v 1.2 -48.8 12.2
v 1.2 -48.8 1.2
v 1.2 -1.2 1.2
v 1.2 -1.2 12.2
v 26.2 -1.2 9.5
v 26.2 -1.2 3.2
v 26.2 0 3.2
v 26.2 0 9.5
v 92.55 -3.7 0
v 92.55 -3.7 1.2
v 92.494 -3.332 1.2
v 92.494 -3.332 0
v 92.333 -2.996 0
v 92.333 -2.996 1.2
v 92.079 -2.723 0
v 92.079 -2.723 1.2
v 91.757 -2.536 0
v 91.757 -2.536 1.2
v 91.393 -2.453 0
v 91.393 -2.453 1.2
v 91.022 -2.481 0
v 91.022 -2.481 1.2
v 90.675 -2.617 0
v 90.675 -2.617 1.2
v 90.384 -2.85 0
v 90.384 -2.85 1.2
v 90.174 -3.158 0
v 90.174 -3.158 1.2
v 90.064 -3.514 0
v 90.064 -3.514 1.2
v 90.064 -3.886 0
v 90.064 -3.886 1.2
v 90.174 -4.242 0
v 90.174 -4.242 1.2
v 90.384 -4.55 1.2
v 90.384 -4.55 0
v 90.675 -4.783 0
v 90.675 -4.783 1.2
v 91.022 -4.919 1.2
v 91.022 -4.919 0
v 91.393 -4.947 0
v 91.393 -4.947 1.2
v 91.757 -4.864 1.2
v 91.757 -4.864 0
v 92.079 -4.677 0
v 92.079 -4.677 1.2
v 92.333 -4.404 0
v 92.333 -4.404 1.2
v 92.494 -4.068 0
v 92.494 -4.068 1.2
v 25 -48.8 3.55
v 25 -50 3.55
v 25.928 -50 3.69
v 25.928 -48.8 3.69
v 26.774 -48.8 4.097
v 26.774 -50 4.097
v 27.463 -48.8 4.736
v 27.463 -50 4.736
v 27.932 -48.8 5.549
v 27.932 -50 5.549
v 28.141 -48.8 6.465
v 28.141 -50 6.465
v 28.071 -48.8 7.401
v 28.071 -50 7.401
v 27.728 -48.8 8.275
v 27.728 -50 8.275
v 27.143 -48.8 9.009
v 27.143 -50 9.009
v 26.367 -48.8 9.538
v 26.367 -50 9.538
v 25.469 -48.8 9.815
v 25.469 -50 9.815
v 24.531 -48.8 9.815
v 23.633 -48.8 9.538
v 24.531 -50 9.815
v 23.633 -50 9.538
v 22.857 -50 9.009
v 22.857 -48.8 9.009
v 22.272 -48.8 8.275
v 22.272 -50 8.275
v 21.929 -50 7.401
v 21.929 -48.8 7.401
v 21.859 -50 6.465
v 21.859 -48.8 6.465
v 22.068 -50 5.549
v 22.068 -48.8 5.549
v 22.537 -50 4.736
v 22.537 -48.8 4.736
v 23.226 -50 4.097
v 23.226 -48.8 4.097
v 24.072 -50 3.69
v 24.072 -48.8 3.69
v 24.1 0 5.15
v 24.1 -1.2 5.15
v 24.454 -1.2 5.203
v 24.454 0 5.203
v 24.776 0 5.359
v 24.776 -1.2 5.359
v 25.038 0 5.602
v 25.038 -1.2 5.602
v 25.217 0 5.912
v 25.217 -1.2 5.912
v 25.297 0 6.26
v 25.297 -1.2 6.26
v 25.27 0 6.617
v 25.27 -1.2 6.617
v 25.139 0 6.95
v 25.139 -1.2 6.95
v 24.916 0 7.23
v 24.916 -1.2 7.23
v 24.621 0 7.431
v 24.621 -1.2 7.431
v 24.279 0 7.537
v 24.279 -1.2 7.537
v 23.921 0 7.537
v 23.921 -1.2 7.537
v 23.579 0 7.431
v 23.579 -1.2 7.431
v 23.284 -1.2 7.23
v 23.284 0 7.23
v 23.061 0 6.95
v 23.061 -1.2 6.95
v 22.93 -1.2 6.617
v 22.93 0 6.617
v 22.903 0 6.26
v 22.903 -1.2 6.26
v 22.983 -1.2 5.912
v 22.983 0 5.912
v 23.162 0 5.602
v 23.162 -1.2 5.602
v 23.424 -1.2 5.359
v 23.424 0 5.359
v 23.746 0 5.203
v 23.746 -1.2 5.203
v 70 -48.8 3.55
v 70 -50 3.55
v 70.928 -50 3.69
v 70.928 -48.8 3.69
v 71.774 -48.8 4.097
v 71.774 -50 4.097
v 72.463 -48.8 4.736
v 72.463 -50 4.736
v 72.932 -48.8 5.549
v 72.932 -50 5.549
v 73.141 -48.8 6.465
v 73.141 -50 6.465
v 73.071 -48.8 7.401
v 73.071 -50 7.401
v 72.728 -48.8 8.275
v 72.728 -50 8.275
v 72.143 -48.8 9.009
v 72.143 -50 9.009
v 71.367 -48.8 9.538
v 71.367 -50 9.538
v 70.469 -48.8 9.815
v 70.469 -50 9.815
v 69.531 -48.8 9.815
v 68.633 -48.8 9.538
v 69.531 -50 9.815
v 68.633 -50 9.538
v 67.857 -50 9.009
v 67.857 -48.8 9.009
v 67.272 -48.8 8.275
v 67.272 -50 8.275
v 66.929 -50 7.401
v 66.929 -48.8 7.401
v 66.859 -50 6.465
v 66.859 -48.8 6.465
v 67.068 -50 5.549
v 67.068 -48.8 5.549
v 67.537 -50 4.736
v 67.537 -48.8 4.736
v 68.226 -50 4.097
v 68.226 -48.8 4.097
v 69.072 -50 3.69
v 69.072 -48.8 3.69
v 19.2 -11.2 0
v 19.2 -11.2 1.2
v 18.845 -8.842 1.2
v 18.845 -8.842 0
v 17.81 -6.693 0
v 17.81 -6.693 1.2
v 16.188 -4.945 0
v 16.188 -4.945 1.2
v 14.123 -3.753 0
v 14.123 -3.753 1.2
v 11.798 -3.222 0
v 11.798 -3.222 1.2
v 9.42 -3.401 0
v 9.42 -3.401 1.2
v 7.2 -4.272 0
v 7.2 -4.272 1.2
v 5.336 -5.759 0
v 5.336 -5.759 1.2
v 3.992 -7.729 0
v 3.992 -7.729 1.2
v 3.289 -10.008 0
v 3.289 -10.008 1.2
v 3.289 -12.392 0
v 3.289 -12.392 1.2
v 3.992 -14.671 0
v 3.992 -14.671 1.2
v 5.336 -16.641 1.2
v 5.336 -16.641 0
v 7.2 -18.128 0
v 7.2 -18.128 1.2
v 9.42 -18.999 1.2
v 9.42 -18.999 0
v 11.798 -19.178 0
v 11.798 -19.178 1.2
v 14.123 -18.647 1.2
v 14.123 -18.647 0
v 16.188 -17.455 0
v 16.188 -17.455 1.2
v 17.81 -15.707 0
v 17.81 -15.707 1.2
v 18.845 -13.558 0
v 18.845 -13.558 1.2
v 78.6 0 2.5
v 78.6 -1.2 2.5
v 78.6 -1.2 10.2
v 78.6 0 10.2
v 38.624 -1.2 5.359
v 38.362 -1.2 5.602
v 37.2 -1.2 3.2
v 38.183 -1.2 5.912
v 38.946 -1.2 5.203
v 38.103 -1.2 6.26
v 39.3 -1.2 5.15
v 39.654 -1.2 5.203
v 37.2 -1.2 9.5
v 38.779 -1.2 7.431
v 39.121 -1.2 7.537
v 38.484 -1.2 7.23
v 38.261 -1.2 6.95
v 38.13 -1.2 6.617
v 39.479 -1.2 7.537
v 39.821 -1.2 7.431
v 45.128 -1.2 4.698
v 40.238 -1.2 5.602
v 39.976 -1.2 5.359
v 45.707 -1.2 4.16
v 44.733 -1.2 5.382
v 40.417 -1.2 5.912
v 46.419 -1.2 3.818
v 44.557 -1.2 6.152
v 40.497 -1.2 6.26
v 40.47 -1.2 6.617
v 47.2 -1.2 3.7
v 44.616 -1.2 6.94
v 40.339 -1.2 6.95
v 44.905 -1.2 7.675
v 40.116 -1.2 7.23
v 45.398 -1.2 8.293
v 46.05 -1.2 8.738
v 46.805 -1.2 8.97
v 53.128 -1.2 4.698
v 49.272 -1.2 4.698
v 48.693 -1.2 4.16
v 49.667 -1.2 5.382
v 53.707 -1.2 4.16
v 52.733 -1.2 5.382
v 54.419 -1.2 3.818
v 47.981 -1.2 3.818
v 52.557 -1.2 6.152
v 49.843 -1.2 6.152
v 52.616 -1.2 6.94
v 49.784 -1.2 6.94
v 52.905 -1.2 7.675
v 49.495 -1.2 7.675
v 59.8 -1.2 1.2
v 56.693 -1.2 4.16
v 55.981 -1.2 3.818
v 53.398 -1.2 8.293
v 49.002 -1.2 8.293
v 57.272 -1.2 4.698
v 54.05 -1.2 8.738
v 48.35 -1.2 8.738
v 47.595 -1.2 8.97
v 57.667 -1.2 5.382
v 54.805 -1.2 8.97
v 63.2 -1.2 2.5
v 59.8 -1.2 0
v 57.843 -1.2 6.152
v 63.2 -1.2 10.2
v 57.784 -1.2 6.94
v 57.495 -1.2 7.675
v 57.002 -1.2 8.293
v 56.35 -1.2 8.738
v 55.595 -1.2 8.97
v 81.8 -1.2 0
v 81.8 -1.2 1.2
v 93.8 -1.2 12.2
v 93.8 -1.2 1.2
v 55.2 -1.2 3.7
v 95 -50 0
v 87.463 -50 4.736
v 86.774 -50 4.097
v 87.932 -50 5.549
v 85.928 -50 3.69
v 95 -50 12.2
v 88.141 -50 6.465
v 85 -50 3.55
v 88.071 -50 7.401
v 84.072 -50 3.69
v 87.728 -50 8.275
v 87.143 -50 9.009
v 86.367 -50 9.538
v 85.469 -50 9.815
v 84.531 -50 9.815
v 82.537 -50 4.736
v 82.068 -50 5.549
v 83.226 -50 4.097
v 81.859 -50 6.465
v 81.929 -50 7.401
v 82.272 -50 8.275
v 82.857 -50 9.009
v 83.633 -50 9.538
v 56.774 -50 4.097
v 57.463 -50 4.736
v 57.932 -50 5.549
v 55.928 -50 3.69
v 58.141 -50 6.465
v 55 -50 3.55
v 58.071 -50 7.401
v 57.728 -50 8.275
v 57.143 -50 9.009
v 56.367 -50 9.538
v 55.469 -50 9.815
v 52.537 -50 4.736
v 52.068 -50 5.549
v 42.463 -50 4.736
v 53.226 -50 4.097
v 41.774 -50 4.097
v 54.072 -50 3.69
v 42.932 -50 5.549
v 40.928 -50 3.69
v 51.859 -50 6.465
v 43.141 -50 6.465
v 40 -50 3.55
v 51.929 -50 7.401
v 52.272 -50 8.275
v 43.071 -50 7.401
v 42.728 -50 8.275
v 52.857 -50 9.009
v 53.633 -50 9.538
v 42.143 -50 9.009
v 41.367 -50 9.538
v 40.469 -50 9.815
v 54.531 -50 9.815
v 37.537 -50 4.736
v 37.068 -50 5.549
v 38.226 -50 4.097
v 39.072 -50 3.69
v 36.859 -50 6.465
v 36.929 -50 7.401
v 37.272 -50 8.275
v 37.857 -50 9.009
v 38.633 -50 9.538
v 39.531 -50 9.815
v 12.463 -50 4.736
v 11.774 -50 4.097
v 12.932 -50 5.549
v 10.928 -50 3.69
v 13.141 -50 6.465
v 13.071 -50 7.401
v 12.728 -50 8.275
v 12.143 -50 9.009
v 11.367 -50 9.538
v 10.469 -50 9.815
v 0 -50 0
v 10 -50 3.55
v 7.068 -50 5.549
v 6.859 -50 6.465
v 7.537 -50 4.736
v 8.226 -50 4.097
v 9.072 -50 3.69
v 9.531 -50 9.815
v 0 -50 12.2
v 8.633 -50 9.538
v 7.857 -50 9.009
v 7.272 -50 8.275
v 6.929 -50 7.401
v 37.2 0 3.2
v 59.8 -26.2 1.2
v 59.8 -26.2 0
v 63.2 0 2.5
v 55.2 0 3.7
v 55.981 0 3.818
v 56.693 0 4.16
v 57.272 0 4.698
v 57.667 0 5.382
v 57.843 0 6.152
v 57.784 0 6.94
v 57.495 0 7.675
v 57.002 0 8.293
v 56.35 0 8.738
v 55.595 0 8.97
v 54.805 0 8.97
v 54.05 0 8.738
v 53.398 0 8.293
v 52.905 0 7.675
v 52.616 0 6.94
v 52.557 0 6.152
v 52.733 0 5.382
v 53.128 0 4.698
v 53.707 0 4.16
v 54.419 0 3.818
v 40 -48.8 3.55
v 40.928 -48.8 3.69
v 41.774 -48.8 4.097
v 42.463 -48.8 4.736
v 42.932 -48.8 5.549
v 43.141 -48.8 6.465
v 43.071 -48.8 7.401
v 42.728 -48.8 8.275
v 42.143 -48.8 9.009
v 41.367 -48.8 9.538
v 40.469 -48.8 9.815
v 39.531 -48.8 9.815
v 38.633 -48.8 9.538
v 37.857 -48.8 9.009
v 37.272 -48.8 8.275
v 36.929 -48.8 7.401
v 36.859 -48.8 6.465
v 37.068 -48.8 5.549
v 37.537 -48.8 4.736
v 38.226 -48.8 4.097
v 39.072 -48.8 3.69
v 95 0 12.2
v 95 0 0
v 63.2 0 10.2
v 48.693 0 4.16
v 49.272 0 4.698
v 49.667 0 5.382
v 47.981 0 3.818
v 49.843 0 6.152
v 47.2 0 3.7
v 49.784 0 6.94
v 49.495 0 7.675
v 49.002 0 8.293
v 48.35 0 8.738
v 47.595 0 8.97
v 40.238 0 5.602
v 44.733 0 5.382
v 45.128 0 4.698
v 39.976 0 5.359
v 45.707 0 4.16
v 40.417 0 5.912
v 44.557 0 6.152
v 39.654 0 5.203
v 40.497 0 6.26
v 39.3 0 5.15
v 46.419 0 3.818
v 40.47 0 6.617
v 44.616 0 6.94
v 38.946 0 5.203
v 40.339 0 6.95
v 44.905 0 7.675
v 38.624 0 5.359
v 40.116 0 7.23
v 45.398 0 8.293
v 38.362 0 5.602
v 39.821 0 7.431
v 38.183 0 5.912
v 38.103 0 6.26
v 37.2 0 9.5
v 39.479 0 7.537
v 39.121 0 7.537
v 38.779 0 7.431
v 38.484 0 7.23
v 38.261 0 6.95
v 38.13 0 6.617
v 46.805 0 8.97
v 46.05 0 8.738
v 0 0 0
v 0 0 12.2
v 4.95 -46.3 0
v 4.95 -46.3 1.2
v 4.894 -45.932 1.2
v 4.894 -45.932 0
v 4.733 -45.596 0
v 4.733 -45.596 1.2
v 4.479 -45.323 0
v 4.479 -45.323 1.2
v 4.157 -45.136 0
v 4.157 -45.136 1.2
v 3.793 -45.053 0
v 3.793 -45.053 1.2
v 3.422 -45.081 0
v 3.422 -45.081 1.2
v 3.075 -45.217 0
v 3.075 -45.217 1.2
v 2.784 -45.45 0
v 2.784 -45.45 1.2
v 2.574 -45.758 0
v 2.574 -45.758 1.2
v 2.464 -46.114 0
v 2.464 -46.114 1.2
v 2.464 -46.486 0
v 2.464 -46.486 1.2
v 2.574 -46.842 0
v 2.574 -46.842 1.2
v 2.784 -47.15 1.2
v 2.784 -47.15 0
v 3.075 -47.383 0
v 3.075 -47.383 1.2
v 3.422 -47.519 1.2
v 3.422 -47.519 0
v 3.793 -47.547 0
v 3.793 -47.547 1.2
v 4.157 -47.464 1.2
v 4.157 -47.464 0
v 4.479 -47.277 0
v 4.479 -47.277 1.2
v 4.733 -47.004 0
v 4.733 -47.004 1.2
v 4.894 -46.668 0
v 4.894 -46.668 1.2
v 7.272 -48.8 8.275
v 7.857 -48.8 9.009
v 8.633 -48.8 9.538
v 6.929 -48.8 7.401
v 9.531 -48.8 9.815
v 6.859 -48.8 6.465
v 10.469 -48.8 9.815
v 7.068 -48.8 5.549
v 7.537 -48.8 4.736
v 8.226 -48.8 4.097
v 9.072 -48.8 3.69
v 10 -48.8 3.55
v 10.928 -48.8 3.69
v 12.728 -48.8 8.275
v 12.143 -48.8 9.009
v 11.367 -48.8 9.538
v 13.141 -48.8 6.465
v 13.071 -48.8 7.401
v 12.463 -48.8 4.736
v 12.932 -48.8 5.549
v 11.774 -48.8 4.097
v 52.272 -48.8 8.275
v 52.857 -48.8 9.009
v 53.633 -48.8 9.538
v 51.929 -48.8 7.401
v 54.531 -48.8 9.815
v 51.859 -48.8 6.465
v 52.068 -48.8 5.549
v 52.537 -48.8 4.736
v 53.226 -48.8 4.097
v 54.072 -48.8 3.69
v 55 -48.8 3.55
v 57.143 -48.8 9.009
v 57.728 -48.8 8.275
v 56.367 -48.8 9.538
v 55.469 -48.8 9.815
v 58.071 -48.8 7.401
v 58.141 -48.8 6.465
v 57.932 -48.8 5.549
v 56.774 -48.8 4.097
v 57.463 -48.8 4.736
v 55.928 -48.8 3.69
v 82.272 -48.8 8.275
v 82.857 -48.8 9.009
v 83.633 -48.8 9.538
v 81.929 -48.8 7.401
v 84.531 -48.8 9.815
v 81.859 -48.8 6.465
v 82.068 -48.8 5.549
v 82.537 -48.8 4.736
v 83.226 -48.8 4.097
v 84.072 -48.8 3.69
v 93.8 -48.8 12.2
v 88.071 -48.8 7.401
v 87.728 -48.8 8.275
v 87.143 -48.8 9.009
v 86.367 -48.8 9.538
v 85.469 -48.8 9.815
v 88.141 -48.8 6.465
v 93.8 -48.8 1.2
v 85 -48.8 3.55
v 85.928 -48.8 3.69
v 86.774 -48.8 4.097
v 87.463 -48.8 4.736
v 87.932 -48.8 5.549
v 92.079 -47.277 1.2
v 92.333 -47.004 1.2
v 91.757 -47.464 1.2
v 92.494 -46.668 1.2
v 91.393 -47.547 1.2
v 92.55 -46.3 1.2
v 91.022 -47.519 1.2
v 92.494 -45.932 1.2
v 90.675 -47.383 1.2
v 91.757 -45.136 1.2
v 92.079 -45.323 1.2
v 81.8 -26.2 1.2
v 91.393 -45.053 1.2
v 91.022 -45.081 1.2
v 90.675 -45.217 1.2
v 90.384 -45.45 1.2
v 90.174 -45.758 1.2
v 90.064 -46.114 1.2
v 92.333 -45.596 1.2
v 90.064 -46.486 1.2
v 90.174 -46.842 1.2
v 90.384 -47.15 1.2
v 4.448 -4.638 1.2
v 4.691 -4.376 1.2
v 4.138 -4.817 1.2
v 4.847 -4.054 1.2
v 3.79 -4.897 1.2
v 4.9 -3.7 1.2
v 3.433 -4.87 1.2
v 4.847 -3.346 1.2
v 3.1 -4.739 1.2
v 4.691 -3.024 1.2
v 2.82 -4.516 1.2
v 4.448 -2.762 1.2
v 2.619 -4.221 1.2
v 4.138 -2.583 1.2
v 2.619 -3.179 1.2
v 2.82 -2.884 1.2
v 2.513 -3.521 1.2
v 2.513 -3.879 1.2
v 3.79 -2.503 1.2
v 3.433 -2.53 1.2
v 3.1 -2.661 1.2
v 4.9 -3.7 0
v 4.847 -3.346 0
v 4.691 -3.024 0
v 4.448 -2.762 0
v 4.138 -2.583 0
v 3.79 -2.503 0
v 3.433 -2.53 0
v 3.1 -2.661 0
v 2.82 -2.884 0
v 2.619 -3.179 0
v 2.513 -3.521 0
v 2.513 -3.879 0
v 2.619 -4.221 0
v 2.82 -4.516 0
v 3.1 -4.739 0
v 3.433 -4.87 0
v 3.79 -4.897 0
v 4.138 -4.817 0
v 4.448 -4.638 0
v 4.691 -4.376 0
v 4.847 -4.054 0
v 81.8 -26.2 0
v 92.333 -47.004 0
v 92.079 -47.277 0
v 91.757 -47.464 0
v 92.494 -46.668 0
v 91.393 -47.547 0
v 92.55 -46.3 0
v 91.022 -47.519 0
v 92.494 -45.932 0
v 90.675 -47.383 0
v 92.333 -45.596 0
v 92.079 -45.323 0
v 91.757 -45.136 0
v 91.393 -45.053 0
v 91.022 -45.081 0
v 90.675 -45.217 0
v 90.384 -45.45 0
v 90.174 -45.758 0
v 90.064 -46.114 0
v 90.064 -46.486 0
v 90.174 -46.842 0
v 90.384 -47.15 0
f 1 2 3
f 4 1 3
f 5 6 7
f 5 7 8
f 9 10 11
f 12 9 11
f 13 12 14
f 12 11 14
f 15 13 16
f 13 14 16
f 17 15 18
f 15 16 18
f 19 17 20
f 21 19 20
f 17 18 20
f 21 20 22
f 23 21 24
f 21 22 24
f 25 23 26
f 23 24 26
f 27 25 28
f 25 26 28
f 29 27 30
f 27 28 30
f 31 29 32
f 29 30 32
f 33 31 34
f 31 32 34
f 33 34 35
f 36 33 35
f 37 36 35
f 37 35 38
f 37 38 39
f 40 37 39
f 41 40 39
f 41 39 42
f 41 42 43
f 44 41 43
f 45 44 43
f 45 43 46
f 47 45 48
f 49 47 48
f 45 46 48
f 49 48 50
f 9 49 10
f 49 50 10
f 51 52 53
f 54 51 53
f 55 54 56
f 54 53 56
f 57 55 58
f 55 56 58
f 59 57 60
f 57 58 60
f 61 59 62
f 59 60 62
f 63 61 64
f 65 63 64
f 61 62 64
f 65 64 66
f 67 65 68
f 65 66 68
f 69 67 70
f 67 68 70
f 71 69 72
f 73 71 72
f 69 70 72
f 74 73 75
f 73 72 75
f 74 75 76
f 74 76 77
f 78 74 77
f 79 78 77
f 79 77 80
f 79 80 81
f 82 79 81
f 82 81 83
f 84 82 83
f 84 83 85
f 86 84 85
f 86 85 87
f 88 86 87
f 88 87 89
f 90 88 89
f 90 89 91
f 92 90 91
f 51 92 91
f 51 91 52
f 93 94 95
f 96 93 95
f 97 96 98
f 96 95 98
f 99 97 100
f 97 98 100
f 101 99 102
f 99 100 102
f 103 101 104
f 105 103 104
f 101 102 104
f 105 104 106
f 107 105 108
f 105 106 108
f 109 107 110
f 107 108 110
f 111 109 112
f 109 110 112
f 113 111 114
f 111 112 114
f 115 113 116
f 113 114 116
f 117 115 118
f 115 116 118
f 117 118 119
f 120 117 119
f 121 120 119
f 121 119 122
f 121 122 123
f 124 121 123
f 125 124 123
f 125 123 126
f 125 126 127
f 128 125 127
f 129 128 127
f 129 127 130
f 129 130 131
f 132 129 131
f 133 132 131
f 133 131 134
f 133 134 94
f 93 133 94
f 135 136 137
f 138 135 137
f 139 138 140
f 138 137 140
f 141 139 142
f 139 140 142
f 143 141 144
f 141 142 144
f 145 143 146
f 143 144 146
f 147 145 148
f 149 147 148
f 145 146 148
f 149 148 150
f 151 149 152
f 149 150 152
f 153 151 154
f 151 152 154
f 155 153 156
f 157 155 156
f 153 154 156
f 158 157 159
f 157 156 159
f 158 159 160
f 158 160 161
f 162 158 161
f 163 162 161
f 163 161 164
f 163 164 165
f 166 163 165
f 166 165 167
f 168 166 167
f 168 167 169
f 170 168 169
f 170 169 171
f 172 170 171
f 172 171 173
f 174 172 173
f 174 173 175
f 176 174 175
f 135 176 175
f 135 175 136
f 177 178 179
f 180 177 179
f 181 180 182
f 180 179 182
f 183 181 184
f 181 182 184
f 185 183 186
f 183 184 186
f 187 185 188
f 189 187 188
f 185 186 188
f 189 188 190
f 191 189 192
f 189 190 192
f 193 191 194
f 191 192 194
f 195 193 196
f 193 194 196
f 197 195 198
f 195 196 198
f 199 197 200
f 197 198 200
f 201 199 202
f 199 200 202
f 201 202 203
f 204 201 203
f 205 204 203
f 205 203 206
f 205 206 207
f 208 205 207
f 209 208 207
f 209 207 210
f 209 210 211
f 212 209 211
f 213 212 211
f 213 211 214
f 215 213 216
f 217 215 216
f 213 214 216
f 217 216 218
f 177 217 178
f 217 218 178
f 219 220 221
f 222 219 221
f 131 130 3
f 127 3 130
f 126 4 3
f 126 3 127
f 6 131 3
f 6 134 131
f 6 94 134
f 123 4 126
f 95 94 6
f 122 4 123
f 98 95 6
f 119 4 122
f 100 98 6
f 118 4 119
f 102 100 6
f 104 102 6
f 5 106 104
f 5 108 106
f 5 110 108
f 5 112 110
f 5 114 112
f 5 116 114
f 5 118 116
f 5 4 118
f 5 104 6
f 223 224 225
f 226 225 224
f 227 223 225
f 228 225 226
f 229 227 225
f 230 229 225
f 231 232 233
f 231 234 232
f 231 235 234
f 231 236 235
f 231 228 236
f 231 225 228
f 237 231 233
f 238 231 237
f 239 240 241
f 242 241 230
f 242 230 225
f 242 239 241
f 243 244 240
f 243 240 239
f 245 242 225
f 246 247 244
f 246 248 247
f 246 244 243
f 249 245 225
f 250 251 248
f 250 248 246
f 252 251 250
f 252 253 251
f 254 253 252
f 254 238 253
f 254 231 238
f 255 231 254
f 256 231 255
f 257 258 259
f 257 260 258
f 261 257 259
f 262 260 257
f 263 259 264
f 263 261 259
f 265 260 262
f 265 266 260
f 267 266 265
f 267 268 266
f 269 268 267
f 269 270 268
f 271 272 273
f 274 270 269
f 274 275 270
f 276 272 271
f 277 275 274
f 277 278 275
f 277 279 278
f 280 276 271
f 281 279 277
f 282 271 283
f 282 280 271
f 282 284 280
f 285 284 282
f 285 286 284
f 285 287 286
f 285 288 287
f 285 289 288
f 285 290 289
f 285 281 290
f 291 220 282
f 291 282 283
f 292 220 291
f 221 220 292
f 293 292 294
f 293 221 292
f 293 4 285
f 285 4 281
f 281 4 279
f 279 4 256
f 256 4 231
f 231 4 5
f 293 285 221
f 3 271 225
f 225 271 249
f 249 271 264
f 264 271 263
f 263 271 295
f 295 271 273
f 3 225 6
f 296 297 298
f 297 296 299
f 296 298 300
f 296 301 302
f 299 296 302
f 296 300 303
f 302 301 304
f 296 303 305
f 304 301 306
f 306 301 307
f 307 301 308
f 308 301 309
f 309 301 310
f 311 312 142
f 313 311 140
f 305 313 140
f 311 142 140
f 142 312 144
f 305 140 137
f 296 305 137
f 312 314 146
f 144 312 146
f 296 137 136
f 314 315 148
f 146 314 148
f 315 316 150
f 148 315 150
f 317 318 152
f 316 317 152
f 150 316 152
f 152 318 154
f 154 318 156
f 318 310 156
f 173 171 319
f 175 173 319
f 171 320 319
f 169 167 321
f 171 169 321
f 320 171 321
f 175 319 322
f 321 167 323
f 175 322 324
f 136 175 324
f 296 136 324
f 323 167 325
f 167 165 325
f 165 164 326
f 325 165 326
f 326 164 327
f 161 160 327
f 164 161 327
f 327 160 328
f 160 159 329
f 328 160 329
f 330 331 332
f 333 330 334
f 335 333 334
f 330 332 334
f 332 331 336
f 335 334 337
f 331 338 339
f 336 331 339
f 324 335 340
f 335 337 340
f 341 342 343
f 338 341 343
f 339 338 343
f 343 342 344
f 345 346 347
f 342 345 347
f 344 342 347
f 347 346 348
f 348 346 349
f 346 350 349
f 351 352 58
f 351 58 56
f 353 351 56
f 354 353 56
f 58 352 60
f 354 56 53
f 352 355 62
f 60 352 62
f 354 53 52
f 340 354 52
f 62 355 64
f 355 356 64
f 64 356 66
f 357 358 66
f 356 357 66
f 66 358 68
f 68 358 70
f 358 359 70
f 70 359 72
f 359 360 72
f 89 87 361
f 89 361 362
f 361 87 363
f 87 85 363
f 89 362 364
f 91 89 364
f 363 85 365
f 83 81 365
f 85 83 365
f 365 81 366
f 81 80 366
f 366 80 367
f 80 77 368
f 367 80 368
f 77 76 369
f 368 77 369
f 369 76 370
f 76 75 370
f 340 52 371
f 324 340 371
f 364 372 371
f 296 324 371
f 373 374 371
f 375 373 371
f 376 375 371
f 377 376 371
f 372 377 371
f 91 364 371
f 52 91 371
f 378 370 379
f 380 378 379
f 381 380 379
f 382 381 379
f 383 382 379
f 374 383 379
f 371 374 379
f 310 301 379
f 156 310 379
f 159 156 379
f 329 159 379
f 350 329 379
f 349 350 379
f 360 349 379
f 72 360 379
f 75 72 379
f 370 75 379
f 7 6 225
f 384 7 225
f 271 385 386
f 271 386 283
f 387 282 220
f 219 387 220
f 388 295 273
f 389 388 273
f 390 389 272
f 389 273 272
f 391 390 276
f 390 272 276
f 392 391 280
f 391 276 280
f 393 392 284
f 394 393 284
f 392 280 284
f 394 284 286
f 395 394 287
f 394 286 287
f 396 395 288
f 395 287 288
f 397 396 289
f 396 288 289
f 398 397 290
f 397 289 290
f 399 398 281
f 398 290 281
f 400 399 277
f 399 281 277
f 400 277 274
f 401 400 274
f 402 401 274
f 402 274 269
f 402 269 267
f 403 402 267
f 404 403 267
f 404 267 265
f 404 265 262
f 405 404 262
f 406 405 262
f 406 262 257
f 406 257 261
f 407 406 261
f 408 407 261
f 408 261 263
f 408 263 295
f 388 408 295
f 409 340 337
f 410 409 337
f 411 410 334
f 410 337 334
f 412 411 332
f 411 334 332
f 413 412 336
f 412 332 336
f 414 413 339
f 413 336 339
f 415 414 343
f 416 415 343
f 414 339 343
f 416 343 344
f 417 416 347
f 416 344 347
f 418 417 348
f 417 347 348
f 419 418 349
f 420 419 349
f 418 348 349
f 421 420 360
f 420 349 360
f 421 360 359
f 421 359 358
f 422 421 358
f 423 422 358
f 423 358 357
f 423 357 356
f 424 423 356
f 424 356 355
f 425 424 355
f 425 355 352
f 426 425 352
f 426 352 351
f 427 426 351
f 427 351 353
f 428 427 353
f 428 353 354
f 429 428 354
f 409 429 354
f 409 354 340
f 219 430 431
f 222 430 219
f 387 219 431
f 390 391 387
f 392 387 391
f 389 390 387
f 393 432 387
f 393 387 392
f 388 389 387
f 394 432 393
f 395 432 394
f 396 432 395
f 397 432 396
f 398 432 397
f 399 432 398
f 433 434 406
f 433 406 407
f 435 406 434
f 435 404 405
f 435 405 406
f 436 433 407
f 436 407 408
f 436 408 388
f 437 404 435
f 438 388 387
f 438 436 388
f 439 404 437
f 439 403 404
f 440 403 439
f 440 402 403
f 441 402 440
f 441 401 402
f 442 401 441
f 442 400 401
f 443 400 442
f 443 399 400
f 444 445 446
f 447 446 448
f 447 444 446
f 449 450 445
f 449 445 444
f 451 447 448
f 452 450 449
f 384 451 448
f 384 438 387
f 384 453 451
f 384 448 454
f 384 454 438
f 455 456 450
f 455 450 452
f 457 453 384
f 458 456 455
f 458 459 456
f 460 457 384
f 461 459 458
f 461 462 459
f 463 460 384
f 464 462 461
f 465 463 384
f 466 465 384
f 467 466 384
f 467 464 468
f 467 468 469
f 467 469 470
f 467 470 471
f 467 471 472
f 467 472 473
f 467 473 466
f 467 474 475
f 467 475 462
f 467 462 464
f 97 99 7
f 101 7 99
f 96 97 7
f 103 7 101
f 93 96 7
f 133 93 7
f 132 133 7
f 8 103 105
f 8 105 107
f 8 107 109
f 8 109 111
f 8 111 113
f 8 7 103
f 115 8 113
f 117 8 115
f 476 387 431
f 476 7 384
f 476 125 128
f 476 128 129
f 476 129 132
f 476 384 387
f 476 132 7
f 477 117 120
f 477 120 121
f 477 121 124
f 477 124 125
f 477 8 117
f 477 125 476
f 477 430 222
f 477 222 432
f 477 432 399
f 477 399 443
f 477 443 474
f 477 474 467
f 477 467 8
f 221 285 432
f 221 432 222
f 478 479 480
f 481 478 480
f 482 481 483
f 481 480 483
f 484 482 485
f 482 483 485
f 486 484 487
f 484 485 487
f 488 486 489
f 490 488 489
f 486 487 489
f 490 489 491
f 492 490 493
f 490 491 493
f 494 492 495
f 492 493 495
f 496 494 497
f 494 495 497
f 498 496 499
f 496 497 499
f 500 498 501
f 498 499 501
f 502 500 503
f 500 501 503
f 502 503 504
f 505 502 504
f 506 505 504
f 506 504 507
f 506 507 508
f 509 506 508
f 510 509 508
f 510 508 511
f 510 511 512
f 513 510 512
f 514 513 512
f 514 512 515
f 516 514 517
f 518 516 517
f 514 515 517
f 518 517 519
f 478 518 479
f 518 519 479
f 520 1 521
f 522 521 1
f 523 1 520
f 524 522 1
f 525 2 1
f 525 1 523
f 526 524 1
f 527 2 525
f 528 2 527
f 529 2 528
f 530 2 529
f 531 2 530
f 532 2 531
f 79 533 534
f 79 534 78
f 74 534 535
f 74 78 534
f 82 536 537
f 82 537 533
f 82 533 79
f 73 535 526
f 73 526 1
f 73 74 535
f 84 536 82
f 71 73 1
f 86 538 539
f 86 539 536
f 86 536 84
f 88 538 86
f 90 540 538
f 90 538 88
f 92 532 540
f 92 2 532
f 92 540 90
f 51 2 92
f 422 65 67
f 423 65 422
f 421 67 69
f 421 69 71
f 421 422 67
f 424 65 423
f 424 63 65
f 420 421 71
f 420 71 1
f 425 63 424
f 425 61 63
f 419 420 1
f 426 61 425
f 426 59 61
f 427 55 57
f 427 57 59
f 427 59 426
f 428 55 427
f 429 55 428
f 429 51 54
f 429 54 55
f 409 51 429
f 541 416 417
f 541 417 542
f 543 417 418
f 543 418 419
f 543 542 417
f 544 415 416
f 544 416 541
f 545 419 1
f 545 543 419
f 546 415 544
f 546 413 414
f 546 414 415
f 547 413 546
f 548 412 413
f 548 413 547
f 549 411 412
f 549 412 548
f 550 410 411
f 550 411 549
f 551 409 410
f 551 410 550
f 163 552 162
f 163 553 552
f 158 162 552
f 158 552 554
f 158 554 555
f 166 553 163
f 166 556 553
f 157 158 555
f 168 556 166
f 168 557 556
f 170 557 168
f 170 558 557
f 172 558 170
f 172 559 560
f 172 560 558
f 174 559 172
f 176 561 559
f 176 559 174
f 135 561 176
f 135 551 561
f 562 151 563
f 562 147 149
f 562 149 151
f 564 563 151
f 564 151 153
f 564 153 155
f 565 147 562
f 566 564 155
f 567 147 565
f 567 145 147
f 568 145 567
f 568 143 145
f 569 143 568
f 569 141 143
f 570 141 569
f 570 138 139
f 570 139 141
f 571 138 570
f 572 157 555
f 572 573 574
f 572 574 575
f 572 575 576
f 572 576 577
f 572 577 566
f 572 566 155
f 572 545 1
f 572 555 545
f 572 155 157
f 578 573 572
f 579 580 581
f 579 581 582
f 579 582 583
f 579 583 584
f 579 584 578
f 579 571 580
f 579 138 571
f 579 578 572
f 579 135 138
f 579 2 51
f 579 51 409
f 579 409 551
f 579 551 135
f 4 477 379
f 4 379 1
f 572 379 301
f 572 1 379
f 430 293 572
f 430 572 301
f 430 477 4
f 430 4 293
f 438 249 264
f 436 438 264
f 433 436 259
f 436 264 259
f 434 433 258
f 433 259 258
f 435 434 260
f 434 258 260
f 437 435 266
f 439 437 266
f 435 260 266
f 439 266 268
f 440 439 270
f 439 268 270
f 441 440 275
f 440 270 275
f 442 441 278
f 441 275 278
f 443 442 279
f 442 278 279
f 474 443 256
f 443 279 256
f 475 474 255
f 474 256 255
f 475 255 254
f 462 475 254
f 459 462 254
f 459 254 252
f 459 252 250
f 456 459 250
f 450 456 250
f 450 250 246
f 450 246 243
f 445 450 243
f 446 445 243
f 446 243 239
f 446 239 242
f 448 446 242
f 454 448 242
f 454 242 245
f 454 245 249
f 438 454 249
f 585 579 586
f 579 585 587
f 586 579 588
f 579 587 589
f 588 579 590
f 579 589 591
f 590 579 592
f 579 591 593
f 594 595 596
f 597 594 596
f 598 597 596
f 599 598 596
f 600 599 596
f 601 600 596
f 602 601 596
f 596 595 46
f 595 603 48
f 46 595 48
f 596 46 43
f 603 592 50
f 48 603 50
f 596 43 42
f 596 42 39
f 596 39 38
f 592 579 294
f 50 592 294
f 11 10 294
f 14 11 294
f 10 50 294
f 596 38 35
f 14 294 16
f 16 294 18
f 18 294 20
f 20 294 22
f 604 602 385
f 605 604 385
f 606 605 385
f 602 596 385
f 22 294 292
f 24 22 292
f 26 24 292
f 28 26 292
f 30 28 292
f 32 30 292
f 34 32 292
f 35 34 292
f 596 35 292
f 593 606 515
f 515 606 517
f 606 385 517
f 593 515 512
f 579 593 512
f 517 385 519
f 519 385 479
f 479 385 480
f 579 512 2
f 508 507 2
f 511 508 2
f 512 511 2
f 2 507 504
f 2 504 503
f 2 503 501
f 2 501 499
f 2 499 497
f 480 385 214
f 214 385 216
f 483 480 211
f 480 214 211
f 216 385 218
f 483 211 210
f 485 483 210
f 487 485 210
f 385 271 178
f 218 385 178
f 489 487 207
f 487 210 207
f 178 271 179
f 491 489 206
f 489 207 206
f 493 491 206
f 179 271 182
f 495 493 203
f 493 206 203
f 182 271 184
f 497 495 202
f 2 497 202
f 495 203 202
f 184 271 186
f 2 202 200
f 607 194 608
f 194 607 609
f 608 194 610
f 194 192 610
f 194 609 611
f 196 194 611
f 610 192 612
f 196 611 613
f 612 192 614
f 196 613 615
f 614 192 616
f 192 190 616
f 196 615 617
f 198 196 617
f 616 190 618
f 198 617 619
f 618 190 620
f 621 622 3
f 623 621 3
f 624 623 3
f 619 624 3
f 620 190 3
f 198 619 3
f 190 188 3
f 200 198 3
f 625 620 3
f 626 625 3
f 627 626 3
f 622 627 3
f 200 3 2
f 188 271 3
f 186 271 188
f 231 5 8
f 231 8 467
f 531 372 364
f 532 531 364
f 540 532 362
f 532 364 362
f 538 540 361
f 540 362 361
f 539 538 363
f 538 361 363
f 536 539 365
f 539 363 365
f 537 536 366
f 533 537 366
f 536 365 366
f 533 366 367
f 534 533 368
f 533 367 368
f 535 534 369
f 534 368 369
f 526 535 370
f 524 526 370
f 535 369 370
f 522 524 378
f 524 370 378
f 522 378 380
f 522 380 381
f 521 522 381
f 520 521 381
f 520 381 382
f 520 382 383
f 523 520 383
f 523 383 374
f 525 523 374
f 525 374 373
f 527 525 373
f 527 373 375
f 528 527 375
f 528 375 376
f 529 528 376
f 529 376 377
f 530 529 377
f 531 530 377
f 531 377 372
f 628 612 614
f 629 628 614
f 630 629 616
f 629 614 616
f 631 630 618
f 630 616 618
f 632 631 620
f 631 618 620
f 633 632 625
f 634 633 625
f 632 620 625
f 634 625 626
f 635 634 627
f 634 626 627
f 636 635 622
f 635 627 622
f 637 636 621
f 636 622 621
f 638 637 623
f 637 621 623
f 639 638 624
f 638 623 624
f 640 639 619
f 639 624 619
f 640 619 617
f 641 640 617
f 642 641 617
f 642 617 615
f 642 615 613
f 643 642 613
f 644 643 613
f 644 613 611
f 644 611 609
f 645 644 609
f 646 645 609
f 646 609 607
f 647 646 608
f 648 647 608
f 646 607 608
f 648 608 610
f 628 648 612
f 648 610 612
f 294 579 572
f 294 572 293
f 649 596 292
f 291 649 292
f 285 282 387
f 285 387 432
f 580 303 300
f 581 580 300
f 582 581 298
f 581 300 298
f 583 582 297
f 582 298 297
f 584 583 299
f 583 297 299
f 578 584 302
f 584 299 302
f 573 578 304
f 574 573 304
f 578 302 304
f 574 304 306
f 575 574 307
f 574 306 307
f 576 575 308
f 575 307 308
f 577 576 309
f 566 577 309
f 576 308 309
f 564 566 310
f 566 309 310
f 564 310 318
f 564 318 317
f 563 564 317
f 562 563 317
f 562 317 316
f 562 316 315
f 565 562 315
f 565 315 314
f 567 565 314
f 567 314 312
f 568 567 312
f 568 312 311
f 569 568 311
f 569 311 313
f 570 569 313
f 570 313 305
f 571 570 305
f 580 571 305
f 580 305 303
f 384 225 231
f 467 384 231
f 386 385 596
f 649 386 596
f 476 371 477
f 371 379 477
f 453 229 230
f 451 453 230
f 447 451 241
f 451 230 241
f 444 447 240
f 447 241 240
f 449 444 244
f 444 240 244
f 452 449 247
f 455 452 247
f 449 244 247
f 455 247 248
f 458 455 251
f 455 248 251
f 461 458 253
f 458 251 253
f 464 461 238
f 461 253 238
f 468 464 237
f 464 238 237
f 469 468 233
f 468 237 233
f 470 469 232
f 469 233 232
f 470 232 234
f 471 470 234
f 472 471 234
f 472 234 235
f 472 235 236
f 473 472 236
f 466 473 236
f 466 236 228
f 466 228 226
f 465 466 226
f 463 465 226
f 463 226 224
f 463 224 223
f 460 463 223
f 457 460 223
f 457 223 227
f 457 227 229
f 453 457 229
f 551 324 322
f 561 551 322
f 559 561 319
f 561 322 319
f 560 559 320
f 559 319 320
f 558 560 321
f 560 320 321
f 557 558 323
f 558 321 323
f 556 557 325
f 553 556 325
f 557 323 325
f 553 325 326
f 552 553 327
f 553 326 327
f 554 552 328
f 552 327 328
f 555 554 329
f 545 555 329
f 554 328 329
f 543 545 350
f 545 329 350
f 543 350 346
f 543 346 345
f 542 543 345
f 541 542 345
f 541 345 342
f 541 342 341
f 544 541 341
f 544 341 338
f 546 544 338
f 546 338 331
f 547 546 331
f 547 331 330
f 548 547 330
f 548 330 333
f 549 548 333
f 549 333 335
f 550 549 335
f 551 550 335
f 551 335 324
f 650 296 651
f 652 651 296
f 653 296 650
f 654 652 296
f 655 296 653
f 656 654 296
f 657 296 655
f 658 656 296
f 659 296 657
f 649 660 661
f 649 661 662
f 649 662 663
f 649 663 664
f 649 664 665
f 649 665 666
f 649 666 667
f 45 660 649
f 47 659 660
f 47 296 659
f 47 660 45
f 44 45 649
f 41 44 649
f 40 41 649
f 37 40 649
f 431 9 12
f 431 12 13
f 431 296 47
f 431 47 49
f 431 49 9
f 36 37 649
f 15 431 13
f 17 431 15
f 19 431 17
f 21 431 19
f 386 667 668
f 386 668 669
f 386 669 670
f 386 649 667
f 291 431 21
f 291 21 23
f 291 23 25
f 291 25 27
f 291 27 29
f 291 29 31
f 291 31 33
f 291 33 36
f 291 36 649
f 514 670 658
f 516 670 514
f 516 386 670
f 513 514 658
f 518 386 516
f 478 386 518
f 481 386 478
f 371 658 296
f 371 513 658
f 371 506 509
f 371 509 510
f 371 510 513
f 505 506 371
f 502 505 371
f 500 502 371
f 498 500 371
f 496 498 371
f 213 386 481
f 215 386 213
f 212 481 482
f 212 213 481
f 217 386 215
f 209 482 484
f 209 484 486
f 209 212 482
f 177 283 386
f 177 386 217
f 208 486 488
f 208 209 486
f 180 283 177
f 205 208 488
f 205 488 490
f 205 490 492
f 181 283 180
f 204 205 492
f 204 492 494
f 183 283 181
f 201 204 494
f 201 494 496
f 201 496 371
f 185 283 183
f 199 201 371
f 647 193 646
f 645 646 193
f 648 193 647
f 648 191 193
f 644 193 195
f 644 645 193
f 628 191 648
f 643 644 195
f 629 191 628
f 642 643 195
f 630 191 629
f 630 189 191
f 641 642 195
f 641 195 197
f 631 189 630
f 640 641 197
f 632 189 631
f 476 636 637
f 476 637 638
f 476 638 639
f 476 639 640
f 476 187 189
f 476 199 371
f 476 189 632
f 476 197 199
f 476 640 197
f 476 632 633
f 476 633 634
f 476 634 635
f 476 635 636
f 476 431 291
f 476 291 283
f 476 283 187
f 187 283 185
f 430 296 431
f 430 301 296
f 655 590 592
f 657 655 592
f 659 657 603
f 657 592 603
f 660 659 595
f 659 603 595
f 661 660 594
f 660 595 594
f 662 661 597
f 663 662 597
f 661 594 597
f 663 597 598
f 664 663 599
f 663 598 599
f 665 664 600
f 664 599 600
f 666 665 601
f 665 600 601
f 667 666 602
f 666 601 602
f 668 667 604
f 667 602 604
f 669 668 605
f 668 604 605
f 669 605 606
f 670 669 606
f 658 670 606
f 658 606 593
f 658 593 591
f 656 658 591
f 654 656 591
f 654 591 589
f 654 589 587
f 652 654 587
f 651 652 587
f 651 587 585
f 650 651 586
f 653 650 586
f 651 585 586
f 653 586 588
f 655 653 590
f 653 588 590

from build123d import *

# Parameters (mm, degrees)
SKICA2_W                 = 95
SKICA2_H                 = 50
SKICA2_W_2               = 92.6
SKICA2_H_2               = 47.6
P_IDAT_VYSUNUT_M3_DEPTH  = 11
SKICA7_R                 = 1.2
SKICA7_W                 = 11
SKICA7_H                 = 6.3
ODEBRAT_VYSUNUT_M1_DEPTH = 71.924466864
SKICA8_R                 = 2.65
SKICA8_W                 = 15.4
SKICA8_H                 = 7.7
ODEBRAT_VYSUNUT_M2_DEPTH = 71.924466864
SKICA9_R                 = 3.15
ODEBRAT_VYSUNUT_M3_DEPTH = 15
SKICA12_W                = 95
SKICA12_H                = 50
P_IDAT_VYSUNUT_M4_DEPTH  = 1.2
SKICA13_R                = 8
SKICA13_W                = 22
SKICA13_H                = 25
SKICA13_R_2              = 1.2
SKICA13_R_3              = 1.25
ODEBRAT_VYSUNUT_M4_DEPTH = 1.2


with BuildPart() as part:
    # Skica2 → Přidat vysunutím3 (new body)
    with BuildSketch(Plane.XY.offset(1.2)):
        with Locations((47.5, -25)):
            Rectangle(SKICA2_W, SKICA2_H)
        with Locations((47.5, -25)):
            Rectangle(SKICA2_W_2, SKICA2_H_2, mode=Mode.SUBTRACT)
    extrude(amount=P_IDAT_VYSUNUT_M3_DEPTH)

    # Skica7 → Odebrat vysunutím1 (cut, through all)
    with BuildSketch(Plane(origin=(45, -1.2, 0), x_dir=(1, 0, 0), z_dir=(0, -1, 0))):
        with Locations(Location((-20.9, 6.35, 0), (0, 0, 270))):
            Circle(SKICA7_R)
        with Locations(Location((-5.7, 6.35, 0), (0, 0, 270))):
            Circle(SKICA7_R)
        with Locations((-13.3, 6.35)):
            Rectangle(SKICA7_W, SKICA7_H)
    extrude(amount=-ODEBRAT_VYSUNUT_M1_DEPTH, mode=Mode.SUBTRACT)

    # Skica8 → Odebrat vysunutím2 (cut, through all)
    with BuildSketch(Plane(origin=(45, -1.2, 0), x_dir=(1, 0, 0), z_dir=(0, -1, 0))):
        with Locations(Location((2.2, 6.35, 0), (0, 0, 270))):
            Circle(SKICA8_R)
        with Locations(Location((10.2, 6.35, 0), (0, 0, 270))):
            Circle(SKICA8_R)
        with Locations((25.9, 6.35)):
            Rectangle(SKICA8_W, SKICA8_H)
    extrude(amount=-ODEBRAT_VYSUNUT_M2_DEPTH, mode=Mode.SUBTRACT)

    # Skica9 → Odebrat vysunutím3 (cut)
    with BuildSketch(Plane(origin=(45, -50, 0), x_dir=(1, 0, 0), z_dir=(0, -1, 0))):
        with Locations(Location((-20, 6.7, 0), (0, 0, 270))):
            Circle(SKICA9_R)
        with Locations(Location((-5, 6.7, 0), (0, 0, 270))):
            Circle(SKICA9_R)
        with Locations(Location((10, 6.7, 0), (0, 0, 270))):
            Circle(SKICA9_R)
        with Locations(Location((25, 6.7, 0), (0, 0, 270))):
            Circle(SKICA9_R)
        with Locations(Location((40, 6.7, 0), (0, 0, 270))):
            Circle(SKICA9_R)
        with Locations(Location((-35, 6.7, 0), (0, 0, 270))):
            Circle(SKICA9_R)
    extrude(amount=-ODEBRAT_VYSUNUT_M3_DEPTH, mode=Mode.SUBTRACT)

    # Skica12 → Přidat vysunutím4 (add)
    with BuildSketch(Plane(origin=(0, 0, 1.2), x_dir=(-1, 0, 0), z_dir=(0, 0, -1))):
        with Locations((-47.5, -25)):
            Rectangle(SKICA12_W, SKICA12_H)
    extrude(amount=P_IDAT_VYSUNUT_M4_DEPTH)

    # Skica13 → Odebrat vysunutím4 (cut)
    with BuildSketch(Plane.XY.offset(1.2)):
        with Locations((11.2, -11.2)):
            Circle(SKICA13_R)
        with Locations((70.8, -13.7)):
            Rectangle(SKICA13_W, SKICA13_H)
        with Locations((3.7, -3.7)):
            Circle(SKICA13_R_2)
        with Locations((91.3, -3.7)):
            Circle(SKICA13_R_3)
        with Locations((91.3, -46.3)):
            Circle(SKICA13_R_3)
        with Locations((3.7, -46.3)):
            Circle(SKICA13_R_3)
    extrude(amount=-ODEBRAT_VYSUNUT_M4_DEPTH, mode=Mode.SUBTRACT)


solid = part.part
